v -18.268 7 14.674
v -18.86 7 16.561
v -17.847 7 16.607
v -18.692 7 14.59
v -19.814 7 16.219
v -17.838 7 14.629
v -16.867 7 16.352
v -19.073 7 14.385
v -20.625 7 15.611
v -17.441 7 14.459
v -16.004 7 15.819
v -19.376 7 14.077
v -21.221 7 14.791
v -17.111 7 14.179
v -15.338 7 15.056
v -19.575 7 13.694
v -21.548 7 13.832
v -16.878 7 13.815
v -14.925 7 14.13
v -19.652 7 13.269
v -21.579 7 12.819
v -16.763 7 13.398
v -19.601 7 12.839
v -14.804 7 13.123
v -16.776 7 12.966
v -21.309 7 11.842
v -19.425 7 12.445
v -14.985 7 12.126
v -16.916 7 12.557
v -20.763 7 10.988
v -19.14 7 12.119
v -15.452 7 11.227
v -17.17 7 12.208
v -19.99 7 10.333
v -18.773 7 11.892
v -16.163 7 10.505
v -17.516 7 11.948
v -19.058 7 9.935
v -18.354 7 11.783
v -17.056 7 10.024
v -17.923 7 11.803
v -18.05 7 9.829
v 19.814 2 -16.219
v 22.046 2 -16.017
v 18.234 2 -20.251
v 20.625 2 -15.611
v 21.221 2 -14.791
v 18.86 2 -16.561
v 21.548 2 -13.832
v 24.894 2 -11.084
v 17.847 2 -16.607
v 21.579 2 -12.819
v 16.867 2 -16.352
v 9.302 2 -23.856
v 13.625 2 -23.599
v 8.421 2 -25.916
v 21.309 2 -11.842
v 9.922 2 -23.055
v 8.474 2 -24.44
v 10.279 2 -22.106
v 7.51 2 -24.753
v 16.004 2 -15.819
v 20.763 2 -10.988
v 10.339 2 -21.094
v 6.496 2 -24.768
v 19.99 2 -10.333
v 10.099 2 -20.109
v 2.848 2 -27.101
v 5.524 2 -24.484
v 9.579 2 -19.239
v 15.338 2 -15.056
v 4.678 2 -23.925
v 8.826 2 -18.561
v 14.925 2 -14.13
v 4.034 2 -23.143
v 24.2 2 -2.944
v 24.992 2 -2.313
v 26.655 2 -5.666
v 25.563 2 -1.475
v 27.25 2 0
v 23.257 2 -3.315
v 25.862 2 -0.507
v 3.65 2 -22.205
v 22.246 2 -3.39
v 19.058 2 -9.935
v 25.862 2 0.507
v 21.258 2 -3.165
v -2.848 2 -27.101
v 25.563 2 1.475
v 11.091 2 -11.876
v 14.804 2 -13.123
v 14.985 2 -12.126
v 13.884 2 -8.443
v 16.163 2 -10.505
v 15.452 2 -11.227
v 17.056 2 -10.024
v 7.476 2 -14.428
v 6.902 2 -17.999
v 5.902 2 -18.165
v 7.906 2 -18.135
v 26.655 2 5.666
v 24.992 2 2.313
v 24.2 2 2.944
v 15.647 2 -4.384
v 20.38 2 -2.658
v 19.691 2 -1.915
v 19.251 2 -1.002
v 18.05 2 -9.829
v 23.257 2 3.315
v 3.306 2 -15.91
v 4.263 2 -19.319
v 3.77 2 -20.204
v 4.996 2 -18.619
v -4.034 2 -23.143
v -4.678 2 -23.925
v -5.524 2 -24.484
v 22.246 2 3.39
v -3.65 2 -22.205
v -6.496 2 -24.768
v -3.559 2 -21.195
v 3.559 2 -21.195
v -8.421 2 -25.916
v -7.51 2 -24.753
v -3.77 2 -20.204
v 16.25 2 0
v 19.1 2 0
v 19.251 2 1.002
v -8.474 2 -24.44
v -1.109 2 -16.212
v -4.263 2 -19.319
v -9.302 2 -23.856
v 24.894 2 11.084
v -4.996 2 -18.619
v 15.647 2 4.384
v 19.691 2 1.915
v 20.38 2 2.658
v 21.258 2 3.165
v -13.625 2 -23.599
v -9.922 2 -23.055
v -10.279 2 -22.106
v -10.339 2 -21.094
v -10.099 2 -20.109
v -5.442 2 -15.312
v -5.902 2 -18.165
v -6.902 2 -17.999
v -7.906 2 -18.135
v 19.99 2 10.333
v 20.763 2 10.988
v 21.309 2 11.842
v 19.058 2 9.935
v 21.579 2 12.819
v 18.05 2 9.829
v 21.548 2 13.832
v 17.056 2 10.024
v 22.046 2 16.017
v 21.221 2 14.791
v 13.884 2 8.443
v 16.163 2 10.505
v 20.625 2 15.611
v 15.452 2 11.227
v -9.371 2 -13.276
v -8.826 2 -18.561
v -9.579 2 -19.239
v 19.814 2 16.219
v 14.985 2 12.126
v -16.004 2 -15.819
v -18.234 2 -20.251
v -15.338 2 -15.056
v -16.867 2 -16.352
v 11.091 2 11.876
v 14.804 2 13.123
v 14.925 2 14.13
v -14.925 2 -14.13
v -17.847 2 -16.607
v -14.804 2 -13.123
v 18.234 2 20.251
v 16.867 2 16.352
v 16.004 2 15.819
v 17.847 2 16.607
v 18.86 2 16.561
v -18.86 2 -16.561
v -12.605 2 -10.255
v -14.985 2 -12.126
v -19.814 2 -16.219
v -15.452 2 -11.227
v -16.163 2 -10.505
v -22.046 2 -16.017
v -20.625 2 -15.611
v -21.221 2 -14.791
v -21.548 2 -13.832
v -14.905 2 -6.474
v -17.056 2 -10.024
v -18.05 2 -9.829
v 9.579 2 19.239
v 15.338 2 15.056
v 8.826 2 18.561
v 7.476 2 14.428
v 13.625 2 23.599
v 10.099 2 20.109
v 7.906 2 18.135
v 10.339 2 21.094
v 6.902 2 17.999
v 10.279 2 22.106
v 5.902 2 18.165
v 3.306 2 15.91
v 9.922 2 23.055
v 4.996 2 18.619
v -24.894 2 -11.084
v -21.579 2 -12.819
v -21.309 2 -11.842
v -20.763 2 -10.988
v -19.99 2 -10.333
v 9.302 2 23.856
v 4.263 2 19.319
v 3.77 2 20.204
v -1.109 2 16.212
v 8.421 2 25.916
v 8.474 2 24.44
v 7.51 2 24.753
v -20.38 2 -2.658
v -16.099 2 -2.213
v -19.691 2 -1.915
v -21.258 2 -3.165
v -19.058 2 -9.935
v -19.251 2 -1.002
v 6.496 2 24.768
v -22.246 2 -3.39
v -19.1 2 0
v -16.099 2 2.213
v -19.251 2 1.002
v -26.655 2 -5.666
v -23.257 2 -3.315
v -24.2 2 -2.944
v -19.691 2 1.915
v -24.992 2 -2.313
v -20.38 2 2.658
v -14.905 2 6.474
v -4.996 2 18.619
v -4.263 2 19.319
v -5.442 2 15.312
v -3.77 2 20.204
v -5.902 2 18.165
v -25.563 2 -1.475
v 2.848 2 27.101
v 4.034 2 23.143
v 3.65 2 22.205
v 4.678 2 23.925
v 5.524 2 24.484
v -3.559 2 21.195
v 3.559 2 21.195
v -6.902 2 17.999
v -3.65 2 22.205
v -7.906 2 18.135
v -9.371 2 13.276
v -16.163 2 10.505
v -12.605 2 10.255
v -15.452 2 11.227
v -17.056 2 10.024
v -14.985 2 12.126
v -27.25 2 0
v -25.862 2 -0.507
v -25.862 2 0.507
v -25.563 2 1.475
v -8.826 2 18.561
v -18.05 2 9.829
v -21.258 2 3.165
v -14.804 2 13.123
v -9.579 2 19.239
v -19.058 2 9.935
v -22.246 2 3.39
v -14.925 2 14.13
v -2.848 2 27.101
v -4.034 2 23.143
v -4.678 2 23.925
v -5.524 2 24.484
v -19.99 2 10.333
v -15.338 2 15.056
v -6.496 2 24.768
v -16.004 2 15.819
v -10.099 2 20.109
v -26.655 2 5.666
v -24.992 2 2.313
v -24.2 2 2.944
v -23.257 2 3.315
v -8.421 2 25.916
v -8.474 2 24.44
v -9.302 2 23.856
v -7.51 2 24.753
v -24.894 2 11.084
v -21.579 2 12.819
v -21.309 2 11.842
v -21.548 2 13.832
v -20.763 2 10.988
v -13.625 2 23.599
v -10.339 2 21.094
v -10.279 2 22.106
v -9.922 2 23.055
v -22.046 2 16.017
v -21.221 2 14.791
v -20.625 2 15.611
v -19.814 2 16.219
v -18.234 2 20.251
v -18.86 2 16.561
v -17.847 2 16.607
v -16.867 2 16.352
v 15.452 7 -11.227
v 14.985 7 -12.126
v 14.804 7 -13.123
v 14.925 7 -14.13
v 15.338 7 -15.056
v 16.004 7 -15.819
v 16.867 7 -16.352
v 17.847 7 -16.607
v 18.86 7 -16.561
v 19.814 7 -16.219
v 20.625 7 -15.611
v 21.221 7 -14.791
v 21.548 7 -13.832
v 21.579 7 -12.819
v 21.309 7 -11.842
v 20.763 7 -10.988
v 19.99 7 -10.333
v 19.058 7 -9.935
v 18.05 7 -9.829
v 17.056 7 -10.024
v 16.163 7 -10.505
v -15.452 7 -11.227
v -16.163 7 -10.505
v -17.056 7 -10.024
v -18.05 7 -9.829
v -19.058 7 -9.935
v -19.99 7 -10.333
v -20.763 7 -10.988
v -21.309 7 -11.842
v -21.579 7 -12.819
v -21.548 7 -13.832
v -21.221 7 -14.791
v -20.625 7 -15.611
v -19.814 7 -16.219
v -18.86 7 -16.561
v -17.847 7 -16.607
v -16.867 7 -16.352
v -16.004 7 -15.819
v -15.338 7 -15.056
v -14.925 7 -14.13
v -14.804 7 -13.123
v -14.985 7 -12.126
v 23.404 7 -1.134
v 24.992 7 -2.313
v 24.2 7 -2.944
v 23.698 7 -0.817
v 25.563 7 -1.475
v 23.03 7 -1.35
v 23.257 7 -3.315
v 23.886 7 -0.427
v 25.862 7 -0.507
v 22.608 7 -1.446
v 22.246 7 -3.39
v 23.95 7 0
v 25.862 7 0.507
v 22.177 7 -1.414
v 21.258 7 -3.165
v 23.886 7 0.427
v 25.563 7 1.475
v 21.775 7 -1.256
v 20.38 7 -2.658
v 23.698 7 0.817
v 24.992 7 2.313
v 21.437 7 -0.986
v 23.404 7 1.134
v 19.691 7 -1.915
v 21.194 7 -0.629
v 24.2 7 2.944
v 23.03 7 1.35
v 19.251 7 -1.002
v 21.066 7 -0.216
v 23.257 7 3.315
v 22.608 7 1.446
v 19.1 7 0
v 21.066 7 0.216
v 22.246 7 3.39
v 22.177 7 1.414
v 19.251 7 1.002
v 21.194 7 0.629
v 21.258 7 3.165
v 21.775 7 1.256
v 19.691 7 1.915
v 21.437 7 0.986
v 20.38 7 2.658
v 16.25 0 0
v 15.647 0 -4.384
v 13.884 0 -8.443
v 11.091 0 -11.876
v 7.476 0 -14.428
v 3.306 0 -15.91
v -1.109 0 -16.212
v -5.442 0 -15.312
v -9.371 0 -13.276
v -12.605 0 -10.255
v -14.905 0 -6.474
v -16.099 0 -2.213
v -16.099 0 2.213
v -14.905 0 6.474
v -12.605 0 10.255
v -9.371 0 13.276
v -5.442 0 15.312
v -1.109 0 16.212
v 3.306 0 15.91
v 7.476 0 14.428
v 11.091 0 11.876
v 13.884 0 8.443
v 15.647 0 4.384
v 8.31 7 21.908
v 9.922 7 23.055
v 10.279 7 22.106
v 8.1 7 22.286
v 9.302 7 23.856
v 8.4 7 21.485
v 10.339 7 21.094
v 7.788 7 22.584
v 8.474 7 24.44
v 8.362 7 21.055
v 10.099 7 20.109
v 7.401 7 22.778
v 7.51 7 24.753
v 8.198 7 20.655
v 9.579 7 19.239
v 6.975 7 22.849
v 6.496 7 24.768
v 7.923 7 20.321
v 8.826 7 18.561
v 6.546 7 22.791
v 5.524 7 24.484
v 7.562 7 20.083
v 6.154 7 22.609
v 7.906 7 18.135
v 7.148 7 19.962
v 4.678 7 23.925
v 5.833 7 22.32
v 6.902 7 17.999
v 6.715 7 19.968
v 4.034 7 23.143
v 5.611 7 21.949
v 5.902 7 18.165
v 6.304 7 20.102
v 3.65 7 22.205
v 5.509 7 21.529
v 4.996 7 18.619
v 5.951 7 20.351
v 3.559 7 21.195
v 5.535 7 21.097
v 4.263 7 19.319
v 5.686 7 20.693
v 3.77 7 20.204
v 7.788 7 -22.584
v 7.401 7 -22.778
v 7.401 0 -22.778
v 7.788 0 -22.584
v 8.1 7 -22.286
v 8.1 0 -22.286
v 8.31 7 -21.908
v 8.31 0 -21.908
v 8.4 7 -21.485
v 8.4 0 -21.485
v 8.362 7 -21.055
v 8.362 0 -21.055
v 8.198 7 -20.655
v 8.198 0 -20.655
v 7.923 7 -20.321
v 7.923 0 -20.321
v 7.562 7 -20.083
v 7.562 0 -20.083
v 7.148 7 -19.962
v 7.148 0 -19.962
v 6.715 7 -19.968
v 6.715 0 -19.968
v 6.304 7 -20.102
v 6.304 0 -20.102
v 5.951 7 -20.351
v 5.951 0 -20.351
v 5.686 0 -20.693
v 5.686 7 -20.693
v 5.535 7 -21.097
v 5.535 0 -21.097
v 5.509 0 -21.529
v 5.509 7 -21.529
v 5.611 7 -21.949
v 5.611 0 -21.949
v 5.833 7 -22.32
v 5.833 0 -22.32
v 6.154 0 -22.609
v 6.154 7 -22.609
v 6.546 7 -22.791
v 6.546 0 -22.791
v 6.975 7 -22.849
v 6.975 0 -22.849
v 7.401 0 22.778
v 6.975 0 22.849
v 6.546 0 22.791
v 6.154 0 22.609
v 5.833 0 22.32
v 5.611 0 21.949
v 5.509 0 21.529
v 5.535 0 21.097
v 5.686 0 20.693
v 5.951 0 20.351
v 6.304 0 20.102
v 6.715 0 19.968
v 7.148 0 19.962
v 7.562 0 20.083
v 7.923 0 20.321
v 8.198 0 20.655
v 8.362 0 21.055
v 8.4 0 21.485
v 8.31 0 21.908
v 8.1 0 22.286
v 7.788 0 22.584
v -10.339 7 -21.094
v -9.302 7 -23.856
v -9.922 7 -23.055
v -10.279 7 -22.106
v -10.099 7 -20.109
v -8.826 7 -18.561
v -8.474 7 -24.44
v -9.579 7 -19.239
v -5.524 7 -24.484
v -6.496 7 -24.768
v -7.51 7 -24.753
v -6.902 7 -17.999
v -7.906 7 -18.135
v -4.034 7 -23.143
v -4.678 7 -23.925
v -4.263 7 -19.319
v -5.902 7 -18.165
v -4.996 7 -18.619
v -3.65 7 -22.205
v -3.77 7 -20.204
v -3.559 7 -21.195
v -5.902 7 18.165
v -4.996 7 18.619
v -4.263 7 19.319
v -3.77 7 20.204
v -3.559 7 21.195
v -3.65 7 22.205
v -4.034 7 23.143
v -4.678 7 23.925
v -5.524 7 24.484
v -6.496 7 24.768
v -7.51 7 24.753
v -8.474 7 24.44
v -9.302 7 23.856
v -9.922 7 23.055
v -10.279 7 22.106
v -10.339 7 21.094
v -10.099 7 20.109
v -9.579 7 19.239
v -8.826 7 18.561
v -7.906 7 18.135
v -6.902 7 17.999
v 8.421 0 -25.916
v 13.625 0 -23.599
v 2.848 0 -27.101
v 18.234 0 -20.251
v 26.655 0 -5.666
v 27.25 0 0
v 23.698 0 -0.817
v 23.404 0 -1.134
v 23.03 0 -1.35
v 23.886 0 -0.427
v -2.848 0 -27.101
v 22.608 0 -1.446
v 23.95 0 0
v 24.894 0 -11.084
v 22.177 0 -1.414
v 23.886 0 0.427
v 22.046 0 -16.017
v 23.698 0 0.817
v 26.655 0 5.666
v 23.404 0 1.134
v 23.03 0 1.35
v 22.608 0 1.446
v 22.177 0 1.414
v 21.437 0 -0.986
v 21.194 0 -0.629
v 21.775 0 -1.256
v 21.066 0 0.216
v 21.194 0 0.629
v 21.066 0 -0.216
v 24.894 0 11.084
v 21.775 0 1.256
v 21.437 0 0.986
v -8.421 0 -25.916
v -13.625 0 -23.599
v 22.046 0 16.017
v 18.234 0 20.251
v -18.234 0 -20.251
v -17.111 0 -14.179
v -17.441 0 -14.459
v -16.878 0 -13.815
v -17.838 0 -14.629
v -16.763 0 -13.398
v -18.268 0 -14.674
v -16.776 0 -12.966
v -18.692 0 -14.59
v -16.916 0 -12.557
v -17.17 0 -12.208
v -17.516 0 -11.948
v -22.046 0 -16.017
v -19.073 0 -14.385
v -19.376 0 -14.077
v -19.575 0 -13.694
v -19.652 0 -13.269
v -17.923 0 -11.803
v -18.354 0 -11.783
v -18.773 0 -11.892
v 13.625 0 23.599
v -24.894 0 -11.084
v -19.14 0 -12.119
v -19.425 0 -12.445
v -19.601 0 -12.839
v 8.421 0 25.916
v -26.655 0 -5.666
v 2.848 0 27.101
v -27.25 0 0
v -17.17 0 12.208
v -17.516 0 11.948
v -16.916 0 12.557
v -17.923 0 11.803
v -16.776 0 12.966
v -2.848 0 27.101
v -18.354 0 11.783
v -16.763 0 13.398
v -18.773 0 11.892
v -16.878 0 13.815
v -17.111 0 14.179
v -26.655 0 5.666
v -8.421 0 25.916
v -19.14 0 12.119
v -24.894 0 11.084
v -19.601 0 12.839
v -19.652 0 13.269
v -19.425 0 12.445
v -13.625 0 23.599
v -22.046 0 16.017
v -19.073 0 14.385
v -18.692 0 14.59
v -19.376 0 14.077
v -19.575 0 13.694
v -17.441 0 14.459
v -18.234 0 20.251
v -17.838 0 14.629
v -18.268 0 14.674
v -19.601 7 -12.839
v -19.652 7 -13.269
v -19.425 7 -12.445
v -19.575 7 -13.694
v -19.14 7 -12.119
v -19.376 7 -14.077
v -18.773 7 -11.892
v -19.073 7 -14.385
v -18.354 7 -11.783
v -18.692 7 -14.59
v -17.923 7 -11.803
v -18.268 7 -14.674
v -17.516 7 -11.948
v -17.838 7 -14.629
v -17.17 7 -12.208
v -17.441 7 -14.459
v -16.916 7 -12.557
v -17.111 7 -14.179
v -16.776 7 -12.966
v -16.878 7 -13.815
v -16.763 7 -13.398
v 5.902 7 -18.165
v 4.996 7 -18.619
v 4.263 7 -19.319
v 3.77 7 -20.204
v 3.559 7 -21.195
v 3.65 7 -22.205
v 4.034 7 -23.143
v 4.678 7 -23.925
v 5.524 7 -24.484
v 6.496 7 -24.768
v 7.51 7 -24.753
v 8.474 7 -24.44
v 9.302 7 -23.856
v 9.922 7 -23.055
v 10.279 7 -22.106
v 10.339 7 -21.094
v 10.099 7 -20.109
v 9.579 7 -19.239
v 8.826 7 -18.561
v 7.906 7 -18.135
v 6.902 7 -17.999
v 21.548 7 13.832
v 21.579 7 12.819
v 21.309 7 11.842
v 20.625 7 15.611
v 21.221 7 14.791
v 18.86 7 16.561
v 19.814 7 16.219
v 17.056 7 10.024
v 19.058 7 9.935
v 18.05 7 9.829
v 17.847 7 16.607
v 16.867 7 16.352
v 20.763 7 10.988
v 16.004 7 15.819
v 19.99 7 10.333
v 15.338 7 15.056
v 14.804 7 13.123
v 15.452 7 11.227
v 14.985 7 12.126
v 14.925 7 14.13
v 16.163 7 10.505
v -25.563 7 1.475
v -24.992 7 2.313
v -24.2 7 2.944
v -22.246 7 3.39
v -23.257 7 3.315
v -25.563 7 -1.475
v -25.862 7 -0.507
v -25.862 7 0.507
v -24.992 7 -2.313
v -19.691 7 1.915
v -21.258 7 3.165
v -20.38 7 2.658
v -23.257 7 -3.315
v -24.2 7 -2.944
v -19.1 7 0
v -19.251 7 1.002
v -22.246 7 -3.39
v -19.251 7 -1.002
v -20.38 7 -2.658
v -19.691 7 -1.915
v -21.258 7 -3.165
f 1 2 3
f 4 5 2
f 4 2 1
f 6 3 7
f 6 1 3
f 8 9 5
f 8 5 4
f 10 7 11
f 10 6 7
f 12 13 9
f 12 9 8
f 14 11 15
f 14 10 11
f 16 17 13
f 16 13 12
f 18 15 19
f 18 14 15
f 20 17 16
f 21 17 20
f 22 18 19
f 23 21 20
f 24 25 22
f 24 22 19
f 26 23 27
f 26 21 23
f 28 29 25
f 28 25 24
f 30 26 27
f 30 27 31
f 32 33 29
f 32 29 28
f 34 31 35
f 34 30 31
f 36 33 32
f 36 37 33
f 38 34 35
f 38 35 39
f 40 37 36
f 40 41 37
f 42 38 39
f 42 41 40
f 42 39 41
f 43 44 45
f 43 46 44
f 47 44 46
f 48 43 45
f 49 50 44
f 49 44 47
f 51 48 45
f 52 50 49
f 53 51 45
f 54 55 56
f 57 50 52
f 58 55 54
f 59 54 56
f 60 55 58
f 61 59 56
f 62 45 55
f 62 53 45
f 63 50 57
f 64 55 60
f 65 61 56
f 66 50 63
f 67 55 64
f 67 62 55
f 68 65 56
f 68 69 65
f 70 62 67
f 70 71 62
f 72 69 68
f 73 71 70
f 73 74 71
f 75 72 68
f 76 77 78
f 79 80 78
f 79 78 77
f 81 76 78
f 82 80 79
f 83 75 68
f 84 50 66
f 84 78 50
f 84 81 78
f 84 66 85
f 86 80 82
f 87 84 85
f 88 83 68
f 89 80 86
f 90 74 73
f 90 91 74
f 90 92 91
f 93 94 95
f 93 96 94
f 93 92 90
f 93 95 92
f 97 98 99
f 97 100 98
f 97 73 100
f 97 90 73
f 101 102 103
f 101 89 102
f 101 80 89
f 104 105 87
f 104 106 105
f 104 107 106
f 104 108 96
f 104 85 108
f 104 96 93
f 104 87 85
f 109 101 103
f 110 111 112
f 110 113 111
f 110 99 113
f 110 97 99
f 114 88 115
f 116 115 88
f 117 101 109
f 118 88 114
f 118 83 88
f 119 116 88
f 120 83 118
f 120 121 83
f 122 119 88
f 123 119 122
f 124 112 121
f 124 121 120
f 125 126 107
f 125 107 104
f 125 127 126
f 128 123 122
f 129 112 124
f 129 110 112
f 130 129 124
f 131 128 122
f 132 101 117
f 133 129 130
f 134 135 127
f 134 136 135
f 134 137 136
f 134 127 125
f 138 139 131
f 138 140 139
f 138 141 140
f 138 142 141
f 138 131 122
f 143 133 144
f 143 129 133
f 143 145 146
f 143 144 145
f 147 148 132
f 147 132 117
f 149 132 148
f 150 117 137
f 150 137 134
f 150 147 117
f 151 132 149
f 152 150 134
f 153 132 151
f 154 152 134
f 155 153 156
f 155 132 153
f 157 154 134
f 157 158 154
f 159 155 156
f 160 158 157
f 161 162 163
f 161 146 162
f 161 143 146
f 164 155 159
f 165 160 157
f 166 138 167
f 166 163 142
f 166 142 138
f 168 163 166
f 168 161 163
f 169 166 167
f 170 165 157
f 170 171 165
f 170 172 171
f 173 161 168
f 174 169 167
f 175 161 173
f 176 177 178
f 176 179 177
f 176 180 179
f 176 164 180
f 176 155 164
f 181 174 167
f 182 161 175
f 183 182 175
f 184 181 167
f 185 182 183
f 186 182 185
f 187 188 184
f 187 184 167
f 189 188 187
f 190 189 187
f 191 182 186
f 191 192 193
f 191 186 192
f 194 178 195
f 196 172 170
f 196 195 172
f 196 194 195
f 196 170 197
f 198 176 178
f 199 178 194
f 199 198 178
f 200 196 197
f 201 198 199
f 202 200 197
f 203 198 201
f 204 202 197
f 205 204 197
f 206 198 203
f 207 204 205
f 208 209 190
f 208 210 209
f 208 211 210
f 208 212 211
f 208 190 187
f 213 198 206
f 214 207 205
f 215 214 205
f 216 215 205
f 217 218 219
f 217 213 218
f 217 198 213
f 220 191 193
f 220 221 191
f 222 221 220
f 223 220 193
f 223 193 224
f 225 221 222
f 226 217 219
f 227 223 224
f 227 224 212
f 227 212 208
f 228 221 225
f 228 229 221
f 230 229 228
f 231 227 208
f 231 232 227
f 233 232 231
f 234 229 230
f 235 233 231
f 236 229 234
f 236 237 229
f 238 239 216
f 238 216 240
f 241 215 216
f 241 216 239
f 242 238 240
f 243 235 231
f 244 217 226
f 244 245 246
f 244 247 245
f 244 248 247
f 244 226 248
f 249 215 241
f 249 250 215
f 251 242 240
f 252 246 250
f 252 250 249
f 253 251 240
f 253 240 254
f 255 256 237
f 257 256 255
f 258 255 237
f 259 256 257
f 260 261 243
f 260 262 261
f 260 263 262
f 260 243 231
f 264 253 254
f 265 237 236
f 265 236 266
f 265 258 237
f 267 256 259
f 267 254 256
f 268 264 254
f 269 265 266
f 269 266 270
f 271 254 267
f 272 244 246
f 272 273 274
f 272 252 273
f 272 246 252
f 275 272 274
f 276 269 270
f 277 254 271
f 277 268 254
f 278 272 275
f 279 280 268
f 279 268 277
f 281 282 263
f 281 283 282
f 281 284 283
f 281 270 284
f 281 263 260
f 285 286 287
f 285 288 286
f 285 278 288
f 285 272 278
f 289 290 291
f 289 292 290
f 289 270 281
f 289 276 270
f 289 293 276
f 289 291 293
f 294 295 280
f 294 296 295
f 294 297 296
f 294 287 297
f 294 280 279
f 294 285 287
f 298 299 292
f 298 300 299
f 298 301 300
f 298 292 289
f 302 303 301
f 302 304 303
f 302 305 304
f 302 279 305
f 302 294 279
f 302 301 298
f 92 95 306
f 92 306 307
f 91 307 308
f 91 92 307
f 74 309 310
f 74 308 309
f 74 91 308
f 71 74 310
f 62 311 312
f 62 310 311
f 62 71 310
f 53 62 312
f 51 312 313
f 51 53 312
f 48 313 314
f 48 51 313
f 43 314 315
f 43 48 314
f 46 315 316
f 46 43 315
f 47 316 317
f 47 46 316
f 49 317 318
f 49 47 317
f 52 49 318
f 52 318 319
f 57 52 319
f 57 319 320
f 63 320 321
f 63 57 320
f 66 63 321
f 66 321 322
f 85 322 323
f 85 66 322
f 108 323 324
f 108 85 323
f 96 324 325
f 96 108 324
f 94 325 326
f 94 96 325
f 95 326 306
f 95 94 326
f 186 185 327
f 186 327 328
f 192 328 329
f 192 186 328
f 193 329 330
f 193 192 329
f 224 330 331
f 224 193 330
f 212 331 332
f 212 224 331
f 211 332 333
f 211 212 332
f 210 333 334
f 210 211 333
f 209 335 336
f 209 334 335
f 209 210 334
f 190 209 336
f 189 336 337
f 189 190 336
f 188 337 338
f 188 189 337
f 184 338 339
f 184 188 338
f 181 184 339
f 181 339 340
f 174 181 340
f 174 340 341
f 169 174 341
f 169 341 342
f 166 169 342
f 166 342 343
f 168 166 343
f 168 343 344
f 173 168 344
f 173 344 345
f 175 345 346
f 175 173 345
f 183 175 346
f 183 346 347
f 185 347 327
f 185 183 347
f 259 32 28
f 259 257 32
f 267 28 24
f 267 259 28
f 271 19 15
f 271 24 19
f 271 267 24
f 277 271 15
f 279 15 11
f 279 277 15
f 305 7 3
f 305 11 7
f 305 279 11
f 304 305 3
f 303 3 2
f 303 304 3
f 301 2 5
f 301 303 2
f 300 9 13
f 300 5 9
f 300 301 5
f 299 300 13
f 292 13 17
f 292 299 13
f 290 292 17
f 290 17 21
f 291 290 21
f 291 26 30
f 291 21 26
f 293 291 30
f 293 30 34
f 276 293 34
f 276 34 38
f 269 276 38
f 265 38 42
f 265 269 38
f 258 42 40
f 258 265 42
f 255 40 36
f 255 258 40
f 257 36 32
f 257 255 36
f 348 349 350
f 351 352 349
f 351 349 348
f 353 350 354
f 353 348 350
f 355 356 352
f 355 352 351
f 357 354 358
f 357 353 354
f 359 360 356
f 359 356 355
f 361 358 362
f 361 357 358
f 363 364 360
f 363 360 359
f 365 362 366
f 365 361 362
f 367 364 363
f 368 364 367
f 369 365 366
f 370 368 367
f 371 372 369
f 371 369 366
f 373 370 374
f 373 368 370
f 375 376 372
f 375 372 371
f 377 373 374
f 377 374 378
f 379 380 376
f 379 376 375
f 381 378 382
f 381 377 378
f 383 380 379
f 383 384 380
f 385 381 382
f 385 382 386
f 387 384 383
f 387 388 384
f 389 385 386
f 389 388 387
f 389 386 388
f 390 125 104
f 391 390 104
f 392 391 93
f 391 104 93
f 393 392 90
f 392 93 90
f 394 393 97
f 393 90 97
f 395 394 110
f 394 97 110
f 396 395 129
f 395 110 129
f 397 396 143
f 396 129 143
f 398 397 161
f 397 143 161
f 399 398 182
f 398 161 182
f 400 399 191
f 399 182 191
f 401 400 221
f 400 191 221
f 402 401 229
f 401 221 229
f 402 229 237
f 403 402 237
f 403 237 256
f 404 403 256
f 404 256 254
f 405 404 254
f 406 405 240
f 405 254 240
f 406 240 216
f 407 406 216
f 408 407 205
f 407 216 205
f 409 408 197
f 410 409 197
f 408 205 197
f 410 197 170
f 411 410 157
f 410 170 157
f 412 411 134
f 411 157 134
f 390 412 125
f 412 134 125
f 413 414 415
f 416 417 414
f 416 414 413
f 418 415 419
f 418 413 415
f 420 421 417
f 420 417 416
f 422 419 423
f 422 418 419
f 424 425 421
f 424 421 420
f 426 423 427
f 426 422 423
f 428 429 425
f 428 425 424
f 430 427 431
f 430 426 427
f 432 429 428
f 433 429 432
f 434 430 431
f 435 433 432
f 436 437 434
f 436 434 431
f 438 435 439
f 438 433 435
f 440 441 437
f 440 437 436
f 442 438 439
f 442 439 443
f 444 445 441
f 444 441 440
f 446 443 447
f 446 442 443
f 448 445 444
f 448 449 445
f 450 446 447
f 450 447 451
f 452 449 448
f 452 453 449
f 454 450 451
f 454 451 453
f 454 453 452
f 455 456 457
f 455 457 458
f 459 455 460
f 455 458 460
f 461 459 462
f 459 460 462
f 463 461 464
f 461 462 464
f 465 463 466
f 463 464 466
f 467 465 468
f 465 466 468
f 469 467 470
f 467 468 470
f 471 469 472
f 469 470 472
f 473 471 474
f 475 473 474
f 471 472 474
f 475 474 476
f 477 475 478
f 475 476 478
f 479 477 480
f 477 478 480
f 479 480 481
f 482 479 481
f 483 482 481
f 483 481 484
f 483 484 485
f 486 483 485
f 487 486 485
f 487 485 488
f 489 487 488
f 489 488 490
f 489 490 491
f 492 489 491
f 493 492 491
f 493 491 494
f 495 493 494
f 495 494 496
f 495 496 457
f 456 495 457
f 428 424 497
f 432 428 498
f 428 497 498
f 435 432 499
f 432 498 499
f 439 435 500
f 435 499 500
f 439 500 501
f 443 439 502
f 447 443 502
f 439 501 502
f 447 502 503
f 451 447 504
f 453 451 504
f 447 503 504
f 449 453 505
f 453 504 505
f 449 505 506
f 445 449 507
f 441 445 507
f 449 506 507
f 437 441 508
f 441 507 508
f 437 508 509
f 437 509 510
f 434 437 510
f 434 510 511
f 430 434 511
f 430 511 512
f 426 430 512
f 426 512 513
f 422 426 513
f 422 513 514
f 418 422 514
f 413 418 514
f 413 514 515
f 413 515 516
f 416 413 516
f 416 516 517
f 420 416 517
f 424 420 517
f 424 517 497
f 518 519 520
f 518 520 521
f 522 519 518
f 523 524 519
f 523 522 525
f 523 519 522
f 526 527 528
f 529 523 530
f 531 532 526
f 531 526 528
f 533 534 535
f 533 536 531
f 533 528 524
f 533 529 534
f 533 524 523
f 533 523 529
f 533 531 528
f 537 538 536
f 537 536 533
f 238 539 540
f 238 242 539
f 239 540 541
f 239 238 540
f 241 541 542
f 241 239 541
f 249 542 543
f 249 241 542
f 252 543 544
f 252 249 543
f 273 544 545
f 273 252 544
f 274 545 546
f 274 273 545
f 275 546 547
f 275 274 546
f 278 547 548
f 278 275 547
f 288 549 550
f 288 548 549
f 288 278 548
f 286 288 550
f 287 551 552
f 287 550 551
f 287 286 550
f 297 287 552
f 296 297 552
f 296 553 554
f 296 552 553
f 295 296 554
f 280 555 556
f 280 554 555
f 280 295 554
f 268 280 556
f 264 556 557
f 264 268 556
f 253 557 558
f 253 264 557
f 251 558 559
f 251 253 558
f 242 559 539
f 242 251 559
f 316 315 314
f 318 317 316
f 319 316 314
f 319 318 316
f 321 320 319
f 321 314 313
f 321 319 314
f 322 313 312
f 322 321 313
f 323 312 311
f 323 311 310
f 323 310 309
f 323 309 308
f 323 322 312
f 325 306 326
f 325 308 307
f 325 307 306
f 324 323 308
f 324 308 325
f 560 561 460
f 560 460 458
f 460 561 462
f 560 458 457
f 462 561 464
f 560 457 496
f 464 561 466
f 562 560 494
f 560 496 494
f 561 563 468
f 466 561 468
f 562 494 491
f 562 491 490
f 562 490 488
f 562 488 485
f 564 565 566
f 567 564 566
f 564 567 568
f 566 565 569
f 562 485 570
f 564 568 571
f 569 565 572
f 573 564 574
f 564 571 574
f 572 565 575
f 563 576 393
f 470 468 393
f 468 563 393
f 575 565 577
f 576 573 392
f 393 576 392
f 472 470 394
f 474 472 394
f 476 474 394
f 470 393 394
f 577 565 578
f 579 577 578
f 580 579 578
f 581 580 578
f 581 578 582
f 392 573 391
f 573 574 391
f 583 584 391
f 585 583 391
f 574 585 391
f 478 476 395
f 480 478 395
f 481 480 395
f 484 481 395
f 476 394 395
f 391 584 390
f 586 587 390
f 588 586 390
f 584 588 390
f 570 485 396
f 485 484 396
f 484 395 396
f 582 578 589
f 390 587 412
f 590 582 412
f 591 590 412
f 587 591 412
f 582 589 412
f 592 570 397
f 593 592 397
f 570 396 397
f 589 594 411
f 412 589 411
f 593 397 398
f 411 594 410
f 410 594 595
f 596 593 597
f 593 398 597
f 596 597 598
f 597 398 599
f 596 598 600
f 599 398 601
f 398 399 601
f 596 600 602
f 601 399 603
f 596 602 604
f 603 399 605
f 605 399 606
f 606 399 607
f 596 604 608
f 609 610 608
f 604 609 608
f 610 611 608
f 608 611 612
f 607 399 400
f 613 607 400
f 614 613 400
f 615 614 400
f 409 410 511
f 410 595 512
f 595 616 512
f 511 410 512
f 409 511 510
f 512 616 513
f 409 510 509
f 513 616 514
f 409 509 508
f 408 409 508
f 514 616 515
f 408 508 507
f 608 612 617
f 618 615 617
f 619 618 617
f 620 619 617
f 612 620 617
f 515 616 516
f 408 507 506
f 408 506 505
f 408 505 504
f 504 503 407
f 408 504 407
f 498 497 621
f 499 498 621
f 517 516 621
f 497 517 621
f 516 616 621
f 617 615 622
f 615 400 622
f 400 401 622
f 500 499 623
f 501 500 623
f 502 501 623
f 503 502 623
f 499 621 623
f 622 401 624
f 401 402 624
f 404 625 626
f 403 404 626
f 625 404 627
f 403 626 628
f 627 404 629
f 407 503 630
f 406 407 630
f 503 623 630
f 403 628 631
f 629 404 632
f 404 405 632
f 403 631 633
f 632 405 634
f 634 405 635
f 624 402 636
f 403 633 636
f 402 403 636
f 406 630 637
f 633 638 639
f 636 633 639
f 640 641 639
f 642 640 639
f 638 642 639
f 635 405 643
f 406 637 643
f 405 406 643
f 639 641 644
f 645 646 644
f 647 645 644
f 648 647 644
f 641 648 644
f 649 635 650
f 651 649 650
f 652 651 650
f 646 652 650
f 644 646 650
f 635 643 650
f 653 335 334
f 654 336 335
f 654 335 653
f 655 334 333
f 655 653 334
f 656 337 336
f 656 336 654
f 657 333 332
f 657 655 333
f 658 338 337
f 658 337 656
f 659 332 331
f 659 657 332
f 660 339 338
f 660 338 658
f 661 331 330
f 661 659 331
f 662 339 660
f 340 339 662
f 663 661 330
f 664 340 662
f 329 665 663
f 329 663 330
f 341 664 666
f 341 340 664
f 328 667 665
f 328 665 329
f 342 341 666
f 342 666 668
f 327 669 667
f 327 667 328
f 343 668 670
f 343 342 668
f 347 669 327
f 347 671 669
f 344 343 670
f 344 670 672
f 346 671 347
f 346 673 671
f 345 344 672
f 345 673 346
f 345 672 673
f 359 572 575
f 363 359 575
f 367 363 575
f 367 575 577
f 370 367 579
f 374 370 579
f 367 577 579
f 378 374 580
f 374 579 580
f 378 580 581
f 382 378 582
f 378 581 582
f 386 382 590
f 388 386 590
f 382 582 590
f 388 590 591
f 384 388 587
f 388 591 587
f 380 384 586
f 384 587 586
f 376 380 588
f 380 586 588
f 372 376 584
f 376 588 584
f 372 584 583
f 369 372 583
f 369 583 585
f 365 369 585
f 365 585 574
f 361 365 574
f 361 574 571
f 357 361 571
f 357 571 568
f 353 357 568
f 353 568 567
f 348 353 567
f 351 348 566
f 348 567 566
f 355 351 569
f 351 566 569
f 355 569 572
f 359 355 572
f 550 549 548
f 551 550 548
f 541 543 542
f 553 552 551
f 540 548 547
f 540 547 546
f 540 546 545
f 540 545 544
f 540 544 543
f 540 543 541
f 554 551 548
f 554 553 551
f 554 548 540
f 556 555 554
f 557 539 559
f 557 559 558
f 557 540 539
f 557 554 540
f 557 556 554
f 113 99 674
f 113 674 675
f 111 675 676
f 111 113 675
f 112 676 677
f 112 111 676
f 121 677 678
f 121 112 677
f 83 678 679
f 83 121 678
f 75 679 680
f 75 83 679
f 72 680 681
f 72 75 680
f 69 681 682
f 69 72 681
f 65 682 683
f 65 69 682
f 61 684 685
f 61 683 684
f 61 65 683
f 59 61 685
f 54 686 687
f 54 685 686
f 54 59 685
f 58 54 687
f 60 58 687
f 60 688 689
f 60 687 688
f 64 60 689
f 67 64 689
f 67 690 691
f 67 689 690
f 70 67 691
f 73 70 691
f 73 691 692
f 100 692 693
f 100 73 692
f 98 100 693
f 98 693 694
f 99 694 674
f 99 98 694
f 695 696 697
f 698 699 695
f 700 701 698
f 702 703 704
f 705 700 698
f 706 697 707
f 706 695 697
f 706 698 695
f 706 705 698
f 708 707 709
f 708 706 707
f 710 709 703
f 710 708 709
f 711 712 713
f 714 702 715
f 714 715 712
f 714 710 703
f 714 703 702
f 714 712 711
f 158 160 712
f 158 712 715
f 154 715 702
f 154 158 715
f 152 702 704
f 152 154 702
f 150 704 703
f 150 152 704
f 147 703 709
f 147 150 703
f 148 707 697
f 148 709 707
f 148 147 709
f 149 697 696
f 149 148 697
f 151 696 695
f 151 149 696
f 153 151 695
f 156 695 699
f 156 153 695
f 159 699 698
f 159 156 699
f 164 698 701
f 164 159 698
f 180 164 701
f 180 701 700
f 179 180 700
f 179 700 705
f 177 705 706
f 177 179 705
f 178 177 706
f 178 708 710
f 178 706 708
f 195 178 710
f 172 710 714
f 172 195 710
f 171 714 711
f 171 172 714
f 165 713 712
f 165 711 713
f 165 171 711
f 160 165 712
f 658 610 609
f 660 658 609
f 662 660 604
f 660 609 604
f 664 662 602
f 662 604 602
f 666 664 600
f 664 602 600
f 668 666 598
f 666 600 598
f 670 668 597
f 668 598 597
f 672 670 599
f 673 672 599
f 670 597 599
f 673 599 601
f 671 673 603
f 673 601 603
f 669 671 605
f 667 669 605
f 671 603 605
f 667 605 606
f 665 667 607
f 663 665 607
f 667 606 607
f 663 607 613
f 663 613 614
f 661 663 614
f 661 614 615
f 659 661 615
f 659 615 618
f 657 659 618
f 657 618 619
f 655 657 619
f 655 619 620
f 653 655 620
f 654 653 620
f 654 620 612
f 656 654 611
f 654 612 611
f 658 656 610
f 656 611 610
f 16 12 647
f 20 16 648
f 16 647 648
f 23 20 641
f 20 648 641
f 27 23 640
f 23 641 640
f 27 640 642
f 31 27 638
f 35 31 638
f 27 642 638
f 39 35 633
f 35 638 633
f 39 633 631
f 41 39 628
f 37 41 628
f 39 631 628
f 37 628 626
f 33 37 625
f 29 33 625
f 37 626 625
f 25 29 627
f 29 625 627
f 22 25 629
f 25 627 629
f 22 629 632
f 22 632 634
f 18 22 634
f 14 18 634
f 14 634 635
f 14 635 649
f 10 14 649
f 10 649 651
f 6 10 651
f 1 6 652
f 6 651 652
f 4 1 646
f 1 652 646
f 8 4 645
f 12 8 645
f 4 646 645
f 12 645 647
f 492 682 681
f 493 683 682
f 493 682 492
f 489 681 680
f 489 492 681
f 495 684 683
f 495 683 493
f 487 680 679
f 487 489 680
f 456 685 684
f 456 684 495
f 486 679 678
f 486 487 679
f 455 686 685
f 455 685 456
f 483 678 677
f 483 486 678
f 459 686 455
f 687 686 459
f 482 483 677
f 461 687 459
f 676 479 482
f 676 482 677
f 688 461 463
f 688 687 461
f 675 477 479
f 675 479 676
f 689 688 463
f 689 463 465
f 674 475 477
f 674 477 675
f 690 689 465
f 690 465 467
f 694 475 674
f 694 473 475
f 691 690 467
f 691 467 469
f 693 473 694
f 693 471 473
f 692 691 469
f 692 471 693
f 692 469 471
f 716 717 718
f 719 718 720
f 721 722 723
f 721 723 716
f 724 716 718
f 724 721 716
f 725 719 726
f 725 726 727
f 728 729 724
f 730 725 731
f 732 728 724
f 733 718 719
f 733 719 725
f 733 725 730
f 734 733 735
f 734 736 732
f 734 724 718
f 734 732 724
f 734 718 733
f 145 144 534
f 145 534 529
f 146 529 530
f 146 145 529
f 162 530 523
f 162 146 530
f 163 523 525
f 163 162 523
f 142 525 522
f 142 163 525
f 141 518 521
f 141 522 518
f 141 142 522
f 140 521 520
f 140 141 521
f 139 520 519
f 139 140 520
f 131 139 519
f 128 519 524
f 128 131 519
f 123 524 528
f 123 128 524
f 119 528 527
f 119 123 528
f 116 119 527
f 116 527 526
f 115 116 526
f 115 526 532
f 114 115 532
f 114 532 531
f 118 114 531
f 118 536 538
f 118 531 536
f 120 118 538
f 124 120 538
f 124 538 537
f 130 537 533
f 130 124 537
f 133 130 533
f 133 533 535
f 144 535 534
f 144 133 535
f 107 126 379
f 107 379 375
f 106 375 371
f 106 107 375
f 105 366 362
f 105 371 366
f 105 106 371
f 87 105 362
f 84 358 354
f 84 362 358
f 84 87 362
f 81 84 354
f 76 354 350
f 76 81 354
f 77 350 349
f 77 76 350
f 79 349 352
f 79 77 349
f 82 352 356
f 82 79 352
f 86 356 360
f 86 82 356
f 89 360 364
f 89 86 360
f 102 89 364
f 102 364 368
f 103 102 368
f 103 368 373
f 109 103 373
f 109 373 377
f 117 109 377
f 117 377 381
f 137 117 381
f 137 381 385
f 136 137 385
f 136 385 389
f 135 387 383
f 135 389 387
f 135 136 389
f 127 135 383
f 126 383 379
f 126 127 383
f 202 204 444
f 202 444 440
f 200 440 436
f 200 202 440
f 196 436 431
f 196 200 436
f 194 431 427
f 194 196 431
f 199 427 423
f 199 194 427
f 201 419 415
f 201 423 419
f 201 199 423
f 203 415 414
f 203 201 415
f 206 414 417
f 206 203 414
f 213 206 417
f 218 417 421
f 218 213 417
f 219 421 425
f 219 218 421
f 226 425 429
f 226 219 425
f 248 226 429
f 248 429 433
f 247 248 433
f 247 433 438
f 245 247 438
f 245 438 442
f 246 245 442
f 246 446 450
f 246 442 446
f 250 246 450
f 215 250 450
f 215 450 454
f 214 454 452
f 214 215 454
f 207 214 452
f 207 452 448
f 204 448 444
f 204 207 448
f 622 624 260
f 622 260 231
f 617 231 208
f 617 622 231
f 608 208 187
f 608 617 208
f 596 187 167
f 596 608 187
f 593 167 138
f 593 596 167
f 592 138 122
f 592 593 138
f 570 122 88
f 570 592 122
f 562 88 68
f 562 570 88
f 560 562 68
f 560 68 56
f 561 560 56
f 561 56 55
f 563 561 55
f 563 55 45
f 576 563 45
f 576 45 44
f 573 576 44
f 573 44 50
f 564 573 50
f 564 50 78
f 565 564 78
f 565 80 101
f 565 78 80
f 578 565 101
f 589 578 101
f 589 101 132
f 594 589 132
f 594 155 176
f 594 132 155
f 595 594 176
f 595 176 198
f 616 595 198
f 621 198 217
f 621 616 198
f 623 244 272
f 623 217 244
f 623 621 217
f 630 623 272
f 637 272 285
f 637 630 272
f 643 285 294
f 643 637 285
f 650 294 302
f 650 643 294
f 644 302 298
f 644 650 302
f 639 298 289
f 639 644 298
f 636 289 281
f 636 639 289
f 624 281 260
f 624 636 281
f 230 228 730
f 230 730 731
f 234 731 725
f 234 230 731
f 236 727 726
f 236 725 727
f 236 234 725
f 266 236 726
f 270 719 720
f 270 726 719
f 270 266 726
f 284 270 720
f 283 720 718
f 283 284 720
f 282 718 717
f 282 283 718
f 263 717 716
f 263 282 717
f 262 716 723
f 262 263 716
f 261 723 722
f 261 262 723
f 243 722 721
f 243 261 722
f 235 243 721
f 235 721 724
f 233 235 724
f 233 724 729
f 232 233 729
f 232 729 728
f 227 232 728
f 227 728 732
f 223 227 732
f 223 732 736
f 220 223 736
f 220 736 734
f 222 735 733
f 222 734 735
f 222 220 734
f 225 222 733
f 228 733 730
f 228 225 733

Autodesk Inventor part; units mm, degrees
ref_plane "YZ Plane" through (0, 0, 0) normal (1, 0, 0) x (0, 1, 0)
ref_plane "XZ Plane" through (0, 0, 0) normal (0, 1, 0) x (-1, 0, 0)
ref_plane "XY Plane" through (0, 0, 0) normal (0, 0, 1) x (1, 0, 0)
sketch "Szkic3" plane through (0, 0, 0) normal (0, 1, 0) x (-1, 0, 0)
  circle A0 centre (0, 0) radius 27.25
  dimension "d7" = 54.5
extrude "Wyciągnięcie proste3" add sketch "Szkic3" along normal blind 2
sketch "Szkic4" plane through (0, 2, 0) normal (0, 1, 0) x (1, 0, 0)
  circle A0 centre (-22.5, 0) radius 3.4
  point P0 (0, 0)
  dimension "d10" = 22.5
  dimension "d16" = 6.8
extrude "Wyciągnięcie proste4" add sketch "Szkic4" along normal blind 5
pattern_circular "Szyk kołowy1" count 10 over 360 about axis through (0, 0, 0) along (0, 1, 0) of "Wyciągnięcie proste4"
sketch "Szkic5" plane through (0, 0, 0) normal (0, -1, 0) x (1, 0, 0)
  circle A0 centre (22.5, 0) radius 1.45
  point P0 (0, 0)
  dimension "d17" = 2.9
extrude "Wyciągnięcie proste5" cut sketch "Szkic5" against normal up to surface (7 mm away)
pattern_circular "Szyk kołowy2" count 5 over 360 about axis through (0, 0, 0) along (0, 1, 0) of "Wyciągnięcie proste5"
sketch "Szkic6" plane through (0, 2, 0) normal (0, 1, 0) x (1, 0, 0)
  circle A0 centre (0, 0) radius 16.25
  dimension "d23" = 32.5
extrude "Wyciągnięcie proste6" cut sketch "Szkic6" against normal up to surface (2 mm away)
properties part number "OutputShaft1_3DPrint"
